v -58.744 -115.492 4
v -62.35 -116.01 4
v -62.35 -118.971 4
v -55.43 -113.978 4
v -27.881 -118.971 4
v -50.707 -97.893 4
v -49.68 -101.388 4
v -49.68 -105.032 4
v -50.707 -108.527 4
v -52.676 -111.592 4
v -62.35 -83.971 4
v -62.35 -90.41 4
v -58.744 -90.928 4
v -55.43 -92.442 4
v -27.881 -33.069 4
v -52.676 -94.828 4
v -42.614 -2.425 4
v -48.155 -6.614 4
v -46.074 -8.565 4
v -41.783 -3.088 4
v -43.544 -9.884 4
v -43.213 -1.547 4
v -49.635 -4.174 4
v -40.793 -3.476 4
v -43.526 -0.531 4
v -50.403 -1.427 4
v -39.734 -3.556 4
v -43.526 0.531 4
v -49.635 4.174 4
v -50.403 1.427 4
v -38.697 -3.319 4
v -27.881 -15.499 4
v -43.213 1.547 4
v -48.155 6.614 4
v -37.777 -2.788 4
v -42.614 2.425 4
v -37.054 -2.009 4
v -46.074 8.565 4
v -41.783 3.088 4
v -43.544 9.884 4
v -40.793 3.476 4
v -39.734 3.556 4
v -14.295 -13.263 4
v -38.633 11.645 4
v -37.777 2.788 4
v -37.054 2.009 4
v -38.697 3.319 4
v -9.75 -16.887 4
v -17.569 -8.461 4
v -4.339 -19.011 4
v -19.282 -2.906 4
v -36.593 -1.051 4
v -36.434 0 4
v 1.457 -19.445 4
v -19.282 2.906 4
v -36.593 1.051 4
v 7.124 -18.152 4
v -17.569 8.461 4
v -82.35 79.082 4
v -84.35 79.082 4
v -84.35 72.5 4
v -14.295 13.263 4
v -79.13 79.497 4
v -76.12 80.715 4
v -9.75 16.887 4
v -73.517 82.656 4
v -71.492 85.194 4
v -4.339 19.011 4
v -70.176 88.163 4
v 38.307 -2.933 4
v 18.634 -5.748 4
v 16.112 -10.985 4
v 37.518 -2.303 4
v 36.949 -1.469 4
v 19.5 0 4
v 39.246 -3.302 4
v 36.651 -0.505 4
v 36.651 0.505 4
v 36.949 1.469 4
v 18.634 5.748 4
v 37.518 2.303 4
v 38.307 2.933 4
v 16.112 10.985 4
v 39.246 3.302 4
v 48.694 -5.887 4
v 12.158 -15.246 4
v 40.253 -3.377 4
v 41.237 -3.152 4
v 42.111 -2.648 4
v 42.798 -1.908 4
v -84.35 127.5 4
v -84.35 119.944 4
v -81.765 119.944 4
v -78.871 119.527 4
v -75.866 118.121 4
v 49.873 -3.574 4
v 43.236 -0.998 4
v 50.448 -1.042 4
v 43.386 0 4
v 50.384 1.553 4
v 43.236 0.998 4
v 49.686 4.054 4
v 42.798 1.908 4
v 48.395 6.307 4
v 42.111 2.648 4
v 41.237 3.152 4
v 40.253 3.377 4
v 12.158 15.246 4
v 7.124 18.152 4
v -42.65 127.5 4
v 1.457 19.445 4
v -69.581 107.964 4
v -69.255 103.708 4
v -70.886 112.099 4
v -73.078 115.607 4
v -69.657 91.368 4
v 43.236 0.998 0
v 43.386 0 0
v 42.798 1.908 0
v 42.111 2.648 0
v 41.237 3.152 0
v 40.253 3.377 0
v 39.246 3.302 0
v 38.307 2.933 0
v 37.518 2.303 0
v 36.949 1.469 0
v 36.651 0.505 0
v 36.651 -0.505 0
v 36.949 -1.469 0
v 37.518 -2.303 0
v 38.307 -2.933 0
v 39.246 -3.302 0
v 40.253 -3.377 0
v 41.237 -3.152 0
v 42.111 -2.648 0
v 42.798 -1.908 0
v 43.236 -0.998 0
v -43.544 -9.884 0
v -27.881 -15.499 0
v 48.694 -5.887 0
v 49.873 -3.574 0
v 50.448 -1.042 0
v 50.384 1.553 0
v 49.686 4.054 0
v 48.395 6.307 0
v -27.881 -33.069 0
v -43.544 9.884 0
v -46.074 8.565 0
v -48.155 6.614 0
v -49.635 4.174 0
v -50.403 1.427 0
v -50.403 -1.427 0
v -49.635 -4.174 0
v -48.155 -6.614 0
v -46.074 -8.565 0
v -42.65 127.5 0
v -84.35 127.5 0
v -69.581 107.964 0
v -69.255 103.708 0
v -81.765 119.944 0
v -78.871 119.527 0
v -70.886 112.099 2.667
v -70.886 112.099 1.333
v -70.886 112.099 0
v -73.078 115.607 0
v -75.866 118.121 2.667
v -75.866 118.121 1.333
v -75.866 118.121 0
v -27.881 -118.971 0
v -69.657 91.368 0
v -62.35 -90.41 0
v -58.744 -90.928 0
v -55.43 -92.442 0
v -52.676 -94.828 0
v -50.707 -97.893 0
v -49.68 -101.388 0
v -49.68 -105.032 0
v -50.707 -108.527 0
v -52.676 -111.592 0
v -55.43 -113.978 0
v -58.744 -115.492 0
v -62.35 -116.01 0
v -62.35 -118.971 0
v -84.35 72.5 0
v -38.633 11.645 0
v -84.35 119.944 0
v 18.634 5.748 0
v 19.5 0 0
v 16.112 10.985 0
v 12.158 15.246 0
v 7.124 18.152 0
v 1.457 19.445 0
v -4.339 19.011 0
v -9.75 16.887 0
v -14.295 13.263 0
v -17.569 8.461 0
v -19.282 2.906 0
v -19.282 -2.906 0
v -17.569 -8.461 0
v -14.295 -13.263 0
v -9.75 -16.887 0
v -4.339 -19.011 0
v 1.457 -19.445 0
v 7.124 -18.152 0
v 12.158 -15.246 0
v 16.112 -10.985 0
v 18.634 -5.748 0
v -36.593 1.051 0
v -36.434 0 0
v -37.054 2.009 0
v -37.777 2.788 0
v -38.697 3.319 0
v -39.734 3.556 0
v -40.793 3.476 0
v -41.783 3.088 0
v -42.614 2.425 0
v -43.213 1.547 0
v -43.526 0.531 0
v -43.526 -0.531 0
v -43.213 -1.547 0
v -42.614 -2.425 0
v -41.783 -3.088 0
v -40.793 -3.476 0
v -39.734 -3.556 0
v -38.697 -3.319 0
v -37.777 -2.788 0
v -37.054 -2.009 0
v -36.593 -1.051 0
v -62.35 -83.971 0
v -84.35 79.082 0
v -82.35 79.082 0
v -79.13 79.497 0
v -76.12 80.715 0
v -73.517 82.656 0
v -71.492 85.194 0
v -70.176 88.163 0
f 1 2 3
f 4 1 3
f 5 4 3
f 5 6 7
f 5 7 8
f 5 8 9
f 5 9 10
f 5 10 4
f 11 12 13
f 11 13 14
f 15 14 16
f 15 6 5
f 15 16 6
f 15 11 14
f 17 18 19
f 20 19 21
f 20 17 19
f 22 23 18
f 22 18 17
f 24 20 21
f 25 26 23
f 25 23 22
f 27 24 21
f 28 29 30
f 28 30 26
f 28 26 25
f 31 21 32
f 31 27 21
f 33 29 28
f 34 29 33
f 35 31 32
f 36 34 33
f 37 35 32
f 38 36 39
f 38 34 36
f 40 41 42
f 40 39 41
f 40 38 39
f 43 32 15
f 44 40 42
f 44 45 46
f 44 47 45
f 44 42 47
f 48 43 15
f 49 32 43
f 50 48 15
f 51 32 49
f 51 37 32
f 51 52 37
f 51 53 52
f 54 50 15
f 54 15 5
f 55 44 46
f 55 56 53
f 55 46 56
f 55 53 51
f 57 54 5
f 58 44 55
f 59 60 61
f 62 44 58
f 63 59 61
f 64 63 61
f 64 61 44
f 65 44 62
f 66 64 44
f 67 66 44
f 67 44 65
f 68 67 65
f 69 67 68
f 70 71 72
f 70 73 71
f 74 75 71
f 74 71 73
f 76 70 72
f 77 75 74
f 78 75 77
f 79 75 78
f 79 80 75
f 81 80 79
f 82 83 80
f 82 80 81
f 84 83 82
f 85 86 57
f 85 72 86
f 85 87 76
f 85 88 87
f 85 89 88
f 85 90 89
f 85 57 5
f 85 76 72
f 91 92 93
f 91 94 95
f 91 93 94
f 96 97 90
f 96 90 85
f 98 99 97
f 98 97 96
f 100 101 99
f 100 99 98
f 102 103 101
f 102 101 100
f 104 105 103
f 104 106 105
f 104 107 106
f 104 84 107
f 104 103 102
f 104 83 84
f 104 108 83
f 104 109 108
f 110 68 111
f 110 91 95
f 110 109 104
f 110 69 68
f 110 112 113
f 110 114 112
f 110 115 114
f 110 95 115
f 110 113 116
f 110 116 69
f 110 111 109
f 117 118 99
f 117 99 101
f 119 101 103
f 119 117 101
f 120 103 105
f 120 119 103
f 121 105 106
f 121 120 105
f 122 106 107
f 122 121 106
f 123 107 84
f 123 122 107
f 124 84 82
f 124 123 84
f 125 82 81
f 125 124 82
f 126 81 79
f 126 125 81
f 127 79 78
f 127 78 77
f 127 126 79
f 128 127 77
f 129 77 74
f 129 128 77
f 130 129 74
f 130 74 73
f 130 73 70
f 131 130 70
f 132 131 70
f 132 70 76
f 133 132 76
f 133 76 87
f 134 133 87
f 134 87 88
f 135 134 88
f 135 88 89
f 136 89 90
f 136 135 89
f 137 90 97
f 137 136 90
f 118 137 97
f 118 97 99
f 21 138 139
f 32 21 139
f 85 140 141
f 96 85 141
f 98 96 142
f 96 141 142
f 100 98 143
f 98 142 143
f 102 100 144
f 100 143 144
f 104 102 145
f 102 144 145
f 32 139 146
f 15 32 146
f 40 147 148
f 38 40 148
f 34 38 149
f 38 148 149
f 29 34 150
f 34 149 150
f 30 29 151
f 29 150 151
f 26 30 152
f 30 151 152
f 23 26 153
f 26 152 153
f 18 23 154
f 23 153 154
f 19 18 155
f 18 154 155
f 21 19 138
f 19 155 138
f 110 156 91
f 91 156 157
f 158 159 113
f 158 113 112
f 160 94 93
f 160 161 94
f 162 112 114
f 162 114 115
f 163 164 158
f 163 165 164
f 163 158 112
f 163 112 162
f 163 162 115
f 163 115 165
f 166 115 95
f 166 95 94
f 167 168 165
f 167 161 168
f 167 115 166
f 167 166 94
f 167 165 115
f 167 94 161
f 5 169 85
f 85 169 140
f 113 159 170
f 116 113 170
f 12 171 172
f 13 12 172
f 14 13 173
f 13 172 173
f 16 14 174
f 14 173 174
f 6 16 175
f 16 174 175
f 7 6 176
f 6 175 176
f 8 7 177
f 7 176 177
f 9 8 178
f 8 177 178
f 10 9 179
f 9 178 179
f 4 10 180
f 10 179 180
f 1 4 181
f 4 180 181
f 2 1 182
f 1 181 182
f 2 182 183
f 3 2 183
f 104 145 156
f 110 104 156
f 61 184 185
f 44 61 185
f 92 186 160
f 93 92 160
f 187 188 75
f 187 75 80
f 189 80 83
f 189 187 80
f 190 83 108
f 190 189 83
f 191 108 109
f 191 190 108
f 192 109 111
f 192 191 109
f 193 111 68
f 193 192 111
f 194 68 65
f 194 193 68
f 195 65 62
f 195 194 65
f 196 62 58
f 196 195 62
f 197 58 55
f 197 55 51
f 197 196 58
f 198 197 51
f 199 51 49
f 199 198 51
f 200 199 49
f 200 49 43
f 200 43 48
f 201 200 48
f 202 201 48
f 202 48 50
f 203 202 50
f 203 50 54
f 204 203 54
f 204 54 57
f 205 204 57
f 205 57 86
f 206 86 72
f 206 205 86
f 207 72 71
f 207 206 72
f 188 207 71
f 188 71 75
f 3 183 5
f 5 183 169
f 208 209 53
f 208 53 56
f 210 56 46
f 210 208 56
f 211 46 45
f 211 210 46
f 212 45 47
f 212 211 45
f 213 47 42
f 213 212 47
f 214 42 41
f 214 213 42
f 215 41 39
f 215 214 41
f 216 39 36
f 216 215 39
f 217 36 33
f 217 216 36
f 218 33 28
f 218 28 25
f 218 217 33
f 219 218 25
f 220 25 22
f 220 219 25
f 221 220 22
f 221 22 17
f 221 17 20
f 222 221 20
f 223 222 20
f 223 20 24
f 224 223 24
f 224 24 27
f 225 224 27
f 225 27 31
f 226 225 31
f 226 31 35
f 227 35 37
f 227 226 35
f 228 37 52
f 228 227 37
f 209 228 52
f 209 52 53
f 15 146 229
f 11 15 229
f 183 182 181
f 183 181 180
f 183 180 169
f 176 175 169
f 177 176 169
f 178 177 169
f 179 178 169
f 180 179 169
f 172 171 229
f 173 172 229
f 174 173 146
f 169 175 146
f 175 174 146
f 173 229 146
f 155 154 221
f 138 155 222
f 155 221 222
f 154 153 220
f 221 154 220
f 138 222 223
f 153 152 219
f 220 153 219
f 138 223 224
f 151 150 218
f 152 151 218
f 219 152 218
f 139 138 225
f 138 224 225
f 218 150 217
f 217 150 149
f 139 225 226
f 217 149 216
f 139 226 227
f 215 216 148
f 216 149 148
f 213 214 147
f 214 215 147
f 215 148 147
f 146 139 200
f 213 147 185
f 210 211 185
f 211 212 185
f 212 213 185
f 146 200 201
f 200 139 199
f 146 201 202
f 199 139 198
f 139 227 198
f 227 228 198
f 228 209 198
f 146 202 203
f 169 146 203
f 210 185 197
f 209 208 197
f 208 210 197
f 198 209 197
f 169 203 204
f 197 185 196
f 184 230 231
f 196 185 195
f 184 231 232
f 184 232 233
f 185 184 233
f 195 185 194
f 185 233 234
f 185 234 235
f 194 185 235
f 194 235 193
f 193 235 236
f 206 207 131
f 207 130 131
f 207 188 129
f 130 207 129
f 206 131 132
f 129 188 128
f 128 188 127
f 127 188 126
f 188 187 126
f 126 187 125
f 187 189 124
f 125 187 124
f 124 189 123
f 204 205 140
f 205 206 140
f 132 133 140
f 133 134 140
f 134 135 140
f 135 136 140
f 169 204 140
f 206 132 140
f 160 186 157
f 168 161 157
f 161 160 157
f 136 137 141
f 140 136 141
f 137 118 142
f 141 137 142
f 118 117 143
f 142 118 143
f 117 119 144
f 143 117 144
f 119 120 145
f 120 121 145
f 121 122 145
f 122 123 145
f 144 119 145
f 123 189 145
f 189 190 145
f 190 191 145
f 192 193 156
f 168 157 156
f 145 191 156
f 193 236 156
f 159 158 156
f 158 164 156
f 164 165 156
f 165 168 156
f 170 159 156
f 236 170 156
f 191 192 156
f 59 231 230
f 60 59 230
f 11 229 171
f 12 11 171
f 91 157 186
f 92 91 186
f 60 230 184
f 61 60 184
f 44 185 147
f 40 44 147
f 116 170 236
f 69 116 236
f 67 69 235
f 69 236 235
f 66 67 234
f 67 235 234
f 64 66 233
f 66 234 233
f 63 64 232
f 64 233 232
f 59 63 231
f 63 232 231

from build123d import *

# Parameters (mm, degrees)
SKETCH1_R           = 3.565769245
SKETCH1_R_2         = 3.386490401
SKETCH1_R_3         = 19.5
BOSS_EXTRUDE1_DEPTH = 4
CUT_EXTRUDE1_DEPTH  = 4


with BuildPart() as part:
    # Sketch1 → Boss-Extrude1 (new body)
    with BuildSketch(Plane.XY):
        with BuildLine():
            ThreePointArc((-43.54375, 9.883918046), (-50.5, 0), (-43.54375, -9.883918046))
            Line((-43.54375, -9.883918046), (-27.881486705, -15.499418427))
            Line((-27.881486705, -15.499418427), (-27.881486705, -33.069179621))
            Line((-27.881486705, -33.069179621), (-62.35, -83.970607053))
            Line((-62.35, -83.970607053), (-62.35, -90.41))
            ThreePointArc((-62.35, -90.41), (-49.55, -103.21), (-62.35, -116.01))
            Line((-62.35, -116.01), (-62.35, -118.970607053))
            Line((-62.35, -118.970607053), (-27.881486705, -118.970607053))
            Line((-27.881486705, -118.970607053), (48.694184993, -5.887371851))
            ThreePointArc((48.694184993, -5.887371851), (50.496841017, 0.257543533), (48.395000292, 6.306660772))
            Line((48.395000292, 6.306660772), (-42.650294732, 127.5))
            Line((-42.650294732, 127.5), (-84.35, 127.5))
            Line((-84.35, 127.5), (-84.35, 72.5))
            Line((-84.35, 72.5), (-38.632989323, 11.644607286))
            Line((-38.632989323, 11.644607286), (-43.54375, 9.883918046))
        make_face()
        with Locations((-40, 0)):
            Circle(SKETCH1_R, mode=Mode.SUBTRACT)
        with Locations((40, 0)):
            Circle(SKETCH1_R_2, mode=Mode.SUBTRACT)
        Circle(SKETCH1_R_3, mode=Mode.SUBTRACT)
    extrude(amount=BOSS_EXTRUDE1_DEPTH)

    # Sketch2 → Cut-Extrude1 (cut)
    with BuildSketch(Plane(origin=(0, 0, 0), x_dir=(-1, 0, 0), z_dir=(0, 0, -1))):
        with BuildLine():
            Line((82.35, 79.081537598), (84.35, 79.081537598))
            Line((84.35, 79.081537598), (84.35, 119.944066118))
            Line((84.35, 119.944066118), (81.764527257, 119.944066118))
            add(Edge.make_bspline(
                [(69.254665804, 103.707956362), (68.93437366, 113.538092856), (74.471506462, 119.944066118), (81.764527257, 119.944066118)],
                knots=[0.236558718, 0.236558718, 0.236558718, 0.236558718, 1, 1, 1, 1], degree=3, weights=[0.82713852, 0.698801532, 0.756422025, 1]))
            Line((69.254665804, 103.707956362), (69.656735992, 91.3679571))
            ThreePointArc((69.656735992, 91.3679571), (73.517176905, 82.656230142), (82.35, 79.081537598))
        make_face()
    extrude(amount=-CUT_EXTRUDE1_DEPTH, mode=Mode.SUBTRACT)


solid = part.part
